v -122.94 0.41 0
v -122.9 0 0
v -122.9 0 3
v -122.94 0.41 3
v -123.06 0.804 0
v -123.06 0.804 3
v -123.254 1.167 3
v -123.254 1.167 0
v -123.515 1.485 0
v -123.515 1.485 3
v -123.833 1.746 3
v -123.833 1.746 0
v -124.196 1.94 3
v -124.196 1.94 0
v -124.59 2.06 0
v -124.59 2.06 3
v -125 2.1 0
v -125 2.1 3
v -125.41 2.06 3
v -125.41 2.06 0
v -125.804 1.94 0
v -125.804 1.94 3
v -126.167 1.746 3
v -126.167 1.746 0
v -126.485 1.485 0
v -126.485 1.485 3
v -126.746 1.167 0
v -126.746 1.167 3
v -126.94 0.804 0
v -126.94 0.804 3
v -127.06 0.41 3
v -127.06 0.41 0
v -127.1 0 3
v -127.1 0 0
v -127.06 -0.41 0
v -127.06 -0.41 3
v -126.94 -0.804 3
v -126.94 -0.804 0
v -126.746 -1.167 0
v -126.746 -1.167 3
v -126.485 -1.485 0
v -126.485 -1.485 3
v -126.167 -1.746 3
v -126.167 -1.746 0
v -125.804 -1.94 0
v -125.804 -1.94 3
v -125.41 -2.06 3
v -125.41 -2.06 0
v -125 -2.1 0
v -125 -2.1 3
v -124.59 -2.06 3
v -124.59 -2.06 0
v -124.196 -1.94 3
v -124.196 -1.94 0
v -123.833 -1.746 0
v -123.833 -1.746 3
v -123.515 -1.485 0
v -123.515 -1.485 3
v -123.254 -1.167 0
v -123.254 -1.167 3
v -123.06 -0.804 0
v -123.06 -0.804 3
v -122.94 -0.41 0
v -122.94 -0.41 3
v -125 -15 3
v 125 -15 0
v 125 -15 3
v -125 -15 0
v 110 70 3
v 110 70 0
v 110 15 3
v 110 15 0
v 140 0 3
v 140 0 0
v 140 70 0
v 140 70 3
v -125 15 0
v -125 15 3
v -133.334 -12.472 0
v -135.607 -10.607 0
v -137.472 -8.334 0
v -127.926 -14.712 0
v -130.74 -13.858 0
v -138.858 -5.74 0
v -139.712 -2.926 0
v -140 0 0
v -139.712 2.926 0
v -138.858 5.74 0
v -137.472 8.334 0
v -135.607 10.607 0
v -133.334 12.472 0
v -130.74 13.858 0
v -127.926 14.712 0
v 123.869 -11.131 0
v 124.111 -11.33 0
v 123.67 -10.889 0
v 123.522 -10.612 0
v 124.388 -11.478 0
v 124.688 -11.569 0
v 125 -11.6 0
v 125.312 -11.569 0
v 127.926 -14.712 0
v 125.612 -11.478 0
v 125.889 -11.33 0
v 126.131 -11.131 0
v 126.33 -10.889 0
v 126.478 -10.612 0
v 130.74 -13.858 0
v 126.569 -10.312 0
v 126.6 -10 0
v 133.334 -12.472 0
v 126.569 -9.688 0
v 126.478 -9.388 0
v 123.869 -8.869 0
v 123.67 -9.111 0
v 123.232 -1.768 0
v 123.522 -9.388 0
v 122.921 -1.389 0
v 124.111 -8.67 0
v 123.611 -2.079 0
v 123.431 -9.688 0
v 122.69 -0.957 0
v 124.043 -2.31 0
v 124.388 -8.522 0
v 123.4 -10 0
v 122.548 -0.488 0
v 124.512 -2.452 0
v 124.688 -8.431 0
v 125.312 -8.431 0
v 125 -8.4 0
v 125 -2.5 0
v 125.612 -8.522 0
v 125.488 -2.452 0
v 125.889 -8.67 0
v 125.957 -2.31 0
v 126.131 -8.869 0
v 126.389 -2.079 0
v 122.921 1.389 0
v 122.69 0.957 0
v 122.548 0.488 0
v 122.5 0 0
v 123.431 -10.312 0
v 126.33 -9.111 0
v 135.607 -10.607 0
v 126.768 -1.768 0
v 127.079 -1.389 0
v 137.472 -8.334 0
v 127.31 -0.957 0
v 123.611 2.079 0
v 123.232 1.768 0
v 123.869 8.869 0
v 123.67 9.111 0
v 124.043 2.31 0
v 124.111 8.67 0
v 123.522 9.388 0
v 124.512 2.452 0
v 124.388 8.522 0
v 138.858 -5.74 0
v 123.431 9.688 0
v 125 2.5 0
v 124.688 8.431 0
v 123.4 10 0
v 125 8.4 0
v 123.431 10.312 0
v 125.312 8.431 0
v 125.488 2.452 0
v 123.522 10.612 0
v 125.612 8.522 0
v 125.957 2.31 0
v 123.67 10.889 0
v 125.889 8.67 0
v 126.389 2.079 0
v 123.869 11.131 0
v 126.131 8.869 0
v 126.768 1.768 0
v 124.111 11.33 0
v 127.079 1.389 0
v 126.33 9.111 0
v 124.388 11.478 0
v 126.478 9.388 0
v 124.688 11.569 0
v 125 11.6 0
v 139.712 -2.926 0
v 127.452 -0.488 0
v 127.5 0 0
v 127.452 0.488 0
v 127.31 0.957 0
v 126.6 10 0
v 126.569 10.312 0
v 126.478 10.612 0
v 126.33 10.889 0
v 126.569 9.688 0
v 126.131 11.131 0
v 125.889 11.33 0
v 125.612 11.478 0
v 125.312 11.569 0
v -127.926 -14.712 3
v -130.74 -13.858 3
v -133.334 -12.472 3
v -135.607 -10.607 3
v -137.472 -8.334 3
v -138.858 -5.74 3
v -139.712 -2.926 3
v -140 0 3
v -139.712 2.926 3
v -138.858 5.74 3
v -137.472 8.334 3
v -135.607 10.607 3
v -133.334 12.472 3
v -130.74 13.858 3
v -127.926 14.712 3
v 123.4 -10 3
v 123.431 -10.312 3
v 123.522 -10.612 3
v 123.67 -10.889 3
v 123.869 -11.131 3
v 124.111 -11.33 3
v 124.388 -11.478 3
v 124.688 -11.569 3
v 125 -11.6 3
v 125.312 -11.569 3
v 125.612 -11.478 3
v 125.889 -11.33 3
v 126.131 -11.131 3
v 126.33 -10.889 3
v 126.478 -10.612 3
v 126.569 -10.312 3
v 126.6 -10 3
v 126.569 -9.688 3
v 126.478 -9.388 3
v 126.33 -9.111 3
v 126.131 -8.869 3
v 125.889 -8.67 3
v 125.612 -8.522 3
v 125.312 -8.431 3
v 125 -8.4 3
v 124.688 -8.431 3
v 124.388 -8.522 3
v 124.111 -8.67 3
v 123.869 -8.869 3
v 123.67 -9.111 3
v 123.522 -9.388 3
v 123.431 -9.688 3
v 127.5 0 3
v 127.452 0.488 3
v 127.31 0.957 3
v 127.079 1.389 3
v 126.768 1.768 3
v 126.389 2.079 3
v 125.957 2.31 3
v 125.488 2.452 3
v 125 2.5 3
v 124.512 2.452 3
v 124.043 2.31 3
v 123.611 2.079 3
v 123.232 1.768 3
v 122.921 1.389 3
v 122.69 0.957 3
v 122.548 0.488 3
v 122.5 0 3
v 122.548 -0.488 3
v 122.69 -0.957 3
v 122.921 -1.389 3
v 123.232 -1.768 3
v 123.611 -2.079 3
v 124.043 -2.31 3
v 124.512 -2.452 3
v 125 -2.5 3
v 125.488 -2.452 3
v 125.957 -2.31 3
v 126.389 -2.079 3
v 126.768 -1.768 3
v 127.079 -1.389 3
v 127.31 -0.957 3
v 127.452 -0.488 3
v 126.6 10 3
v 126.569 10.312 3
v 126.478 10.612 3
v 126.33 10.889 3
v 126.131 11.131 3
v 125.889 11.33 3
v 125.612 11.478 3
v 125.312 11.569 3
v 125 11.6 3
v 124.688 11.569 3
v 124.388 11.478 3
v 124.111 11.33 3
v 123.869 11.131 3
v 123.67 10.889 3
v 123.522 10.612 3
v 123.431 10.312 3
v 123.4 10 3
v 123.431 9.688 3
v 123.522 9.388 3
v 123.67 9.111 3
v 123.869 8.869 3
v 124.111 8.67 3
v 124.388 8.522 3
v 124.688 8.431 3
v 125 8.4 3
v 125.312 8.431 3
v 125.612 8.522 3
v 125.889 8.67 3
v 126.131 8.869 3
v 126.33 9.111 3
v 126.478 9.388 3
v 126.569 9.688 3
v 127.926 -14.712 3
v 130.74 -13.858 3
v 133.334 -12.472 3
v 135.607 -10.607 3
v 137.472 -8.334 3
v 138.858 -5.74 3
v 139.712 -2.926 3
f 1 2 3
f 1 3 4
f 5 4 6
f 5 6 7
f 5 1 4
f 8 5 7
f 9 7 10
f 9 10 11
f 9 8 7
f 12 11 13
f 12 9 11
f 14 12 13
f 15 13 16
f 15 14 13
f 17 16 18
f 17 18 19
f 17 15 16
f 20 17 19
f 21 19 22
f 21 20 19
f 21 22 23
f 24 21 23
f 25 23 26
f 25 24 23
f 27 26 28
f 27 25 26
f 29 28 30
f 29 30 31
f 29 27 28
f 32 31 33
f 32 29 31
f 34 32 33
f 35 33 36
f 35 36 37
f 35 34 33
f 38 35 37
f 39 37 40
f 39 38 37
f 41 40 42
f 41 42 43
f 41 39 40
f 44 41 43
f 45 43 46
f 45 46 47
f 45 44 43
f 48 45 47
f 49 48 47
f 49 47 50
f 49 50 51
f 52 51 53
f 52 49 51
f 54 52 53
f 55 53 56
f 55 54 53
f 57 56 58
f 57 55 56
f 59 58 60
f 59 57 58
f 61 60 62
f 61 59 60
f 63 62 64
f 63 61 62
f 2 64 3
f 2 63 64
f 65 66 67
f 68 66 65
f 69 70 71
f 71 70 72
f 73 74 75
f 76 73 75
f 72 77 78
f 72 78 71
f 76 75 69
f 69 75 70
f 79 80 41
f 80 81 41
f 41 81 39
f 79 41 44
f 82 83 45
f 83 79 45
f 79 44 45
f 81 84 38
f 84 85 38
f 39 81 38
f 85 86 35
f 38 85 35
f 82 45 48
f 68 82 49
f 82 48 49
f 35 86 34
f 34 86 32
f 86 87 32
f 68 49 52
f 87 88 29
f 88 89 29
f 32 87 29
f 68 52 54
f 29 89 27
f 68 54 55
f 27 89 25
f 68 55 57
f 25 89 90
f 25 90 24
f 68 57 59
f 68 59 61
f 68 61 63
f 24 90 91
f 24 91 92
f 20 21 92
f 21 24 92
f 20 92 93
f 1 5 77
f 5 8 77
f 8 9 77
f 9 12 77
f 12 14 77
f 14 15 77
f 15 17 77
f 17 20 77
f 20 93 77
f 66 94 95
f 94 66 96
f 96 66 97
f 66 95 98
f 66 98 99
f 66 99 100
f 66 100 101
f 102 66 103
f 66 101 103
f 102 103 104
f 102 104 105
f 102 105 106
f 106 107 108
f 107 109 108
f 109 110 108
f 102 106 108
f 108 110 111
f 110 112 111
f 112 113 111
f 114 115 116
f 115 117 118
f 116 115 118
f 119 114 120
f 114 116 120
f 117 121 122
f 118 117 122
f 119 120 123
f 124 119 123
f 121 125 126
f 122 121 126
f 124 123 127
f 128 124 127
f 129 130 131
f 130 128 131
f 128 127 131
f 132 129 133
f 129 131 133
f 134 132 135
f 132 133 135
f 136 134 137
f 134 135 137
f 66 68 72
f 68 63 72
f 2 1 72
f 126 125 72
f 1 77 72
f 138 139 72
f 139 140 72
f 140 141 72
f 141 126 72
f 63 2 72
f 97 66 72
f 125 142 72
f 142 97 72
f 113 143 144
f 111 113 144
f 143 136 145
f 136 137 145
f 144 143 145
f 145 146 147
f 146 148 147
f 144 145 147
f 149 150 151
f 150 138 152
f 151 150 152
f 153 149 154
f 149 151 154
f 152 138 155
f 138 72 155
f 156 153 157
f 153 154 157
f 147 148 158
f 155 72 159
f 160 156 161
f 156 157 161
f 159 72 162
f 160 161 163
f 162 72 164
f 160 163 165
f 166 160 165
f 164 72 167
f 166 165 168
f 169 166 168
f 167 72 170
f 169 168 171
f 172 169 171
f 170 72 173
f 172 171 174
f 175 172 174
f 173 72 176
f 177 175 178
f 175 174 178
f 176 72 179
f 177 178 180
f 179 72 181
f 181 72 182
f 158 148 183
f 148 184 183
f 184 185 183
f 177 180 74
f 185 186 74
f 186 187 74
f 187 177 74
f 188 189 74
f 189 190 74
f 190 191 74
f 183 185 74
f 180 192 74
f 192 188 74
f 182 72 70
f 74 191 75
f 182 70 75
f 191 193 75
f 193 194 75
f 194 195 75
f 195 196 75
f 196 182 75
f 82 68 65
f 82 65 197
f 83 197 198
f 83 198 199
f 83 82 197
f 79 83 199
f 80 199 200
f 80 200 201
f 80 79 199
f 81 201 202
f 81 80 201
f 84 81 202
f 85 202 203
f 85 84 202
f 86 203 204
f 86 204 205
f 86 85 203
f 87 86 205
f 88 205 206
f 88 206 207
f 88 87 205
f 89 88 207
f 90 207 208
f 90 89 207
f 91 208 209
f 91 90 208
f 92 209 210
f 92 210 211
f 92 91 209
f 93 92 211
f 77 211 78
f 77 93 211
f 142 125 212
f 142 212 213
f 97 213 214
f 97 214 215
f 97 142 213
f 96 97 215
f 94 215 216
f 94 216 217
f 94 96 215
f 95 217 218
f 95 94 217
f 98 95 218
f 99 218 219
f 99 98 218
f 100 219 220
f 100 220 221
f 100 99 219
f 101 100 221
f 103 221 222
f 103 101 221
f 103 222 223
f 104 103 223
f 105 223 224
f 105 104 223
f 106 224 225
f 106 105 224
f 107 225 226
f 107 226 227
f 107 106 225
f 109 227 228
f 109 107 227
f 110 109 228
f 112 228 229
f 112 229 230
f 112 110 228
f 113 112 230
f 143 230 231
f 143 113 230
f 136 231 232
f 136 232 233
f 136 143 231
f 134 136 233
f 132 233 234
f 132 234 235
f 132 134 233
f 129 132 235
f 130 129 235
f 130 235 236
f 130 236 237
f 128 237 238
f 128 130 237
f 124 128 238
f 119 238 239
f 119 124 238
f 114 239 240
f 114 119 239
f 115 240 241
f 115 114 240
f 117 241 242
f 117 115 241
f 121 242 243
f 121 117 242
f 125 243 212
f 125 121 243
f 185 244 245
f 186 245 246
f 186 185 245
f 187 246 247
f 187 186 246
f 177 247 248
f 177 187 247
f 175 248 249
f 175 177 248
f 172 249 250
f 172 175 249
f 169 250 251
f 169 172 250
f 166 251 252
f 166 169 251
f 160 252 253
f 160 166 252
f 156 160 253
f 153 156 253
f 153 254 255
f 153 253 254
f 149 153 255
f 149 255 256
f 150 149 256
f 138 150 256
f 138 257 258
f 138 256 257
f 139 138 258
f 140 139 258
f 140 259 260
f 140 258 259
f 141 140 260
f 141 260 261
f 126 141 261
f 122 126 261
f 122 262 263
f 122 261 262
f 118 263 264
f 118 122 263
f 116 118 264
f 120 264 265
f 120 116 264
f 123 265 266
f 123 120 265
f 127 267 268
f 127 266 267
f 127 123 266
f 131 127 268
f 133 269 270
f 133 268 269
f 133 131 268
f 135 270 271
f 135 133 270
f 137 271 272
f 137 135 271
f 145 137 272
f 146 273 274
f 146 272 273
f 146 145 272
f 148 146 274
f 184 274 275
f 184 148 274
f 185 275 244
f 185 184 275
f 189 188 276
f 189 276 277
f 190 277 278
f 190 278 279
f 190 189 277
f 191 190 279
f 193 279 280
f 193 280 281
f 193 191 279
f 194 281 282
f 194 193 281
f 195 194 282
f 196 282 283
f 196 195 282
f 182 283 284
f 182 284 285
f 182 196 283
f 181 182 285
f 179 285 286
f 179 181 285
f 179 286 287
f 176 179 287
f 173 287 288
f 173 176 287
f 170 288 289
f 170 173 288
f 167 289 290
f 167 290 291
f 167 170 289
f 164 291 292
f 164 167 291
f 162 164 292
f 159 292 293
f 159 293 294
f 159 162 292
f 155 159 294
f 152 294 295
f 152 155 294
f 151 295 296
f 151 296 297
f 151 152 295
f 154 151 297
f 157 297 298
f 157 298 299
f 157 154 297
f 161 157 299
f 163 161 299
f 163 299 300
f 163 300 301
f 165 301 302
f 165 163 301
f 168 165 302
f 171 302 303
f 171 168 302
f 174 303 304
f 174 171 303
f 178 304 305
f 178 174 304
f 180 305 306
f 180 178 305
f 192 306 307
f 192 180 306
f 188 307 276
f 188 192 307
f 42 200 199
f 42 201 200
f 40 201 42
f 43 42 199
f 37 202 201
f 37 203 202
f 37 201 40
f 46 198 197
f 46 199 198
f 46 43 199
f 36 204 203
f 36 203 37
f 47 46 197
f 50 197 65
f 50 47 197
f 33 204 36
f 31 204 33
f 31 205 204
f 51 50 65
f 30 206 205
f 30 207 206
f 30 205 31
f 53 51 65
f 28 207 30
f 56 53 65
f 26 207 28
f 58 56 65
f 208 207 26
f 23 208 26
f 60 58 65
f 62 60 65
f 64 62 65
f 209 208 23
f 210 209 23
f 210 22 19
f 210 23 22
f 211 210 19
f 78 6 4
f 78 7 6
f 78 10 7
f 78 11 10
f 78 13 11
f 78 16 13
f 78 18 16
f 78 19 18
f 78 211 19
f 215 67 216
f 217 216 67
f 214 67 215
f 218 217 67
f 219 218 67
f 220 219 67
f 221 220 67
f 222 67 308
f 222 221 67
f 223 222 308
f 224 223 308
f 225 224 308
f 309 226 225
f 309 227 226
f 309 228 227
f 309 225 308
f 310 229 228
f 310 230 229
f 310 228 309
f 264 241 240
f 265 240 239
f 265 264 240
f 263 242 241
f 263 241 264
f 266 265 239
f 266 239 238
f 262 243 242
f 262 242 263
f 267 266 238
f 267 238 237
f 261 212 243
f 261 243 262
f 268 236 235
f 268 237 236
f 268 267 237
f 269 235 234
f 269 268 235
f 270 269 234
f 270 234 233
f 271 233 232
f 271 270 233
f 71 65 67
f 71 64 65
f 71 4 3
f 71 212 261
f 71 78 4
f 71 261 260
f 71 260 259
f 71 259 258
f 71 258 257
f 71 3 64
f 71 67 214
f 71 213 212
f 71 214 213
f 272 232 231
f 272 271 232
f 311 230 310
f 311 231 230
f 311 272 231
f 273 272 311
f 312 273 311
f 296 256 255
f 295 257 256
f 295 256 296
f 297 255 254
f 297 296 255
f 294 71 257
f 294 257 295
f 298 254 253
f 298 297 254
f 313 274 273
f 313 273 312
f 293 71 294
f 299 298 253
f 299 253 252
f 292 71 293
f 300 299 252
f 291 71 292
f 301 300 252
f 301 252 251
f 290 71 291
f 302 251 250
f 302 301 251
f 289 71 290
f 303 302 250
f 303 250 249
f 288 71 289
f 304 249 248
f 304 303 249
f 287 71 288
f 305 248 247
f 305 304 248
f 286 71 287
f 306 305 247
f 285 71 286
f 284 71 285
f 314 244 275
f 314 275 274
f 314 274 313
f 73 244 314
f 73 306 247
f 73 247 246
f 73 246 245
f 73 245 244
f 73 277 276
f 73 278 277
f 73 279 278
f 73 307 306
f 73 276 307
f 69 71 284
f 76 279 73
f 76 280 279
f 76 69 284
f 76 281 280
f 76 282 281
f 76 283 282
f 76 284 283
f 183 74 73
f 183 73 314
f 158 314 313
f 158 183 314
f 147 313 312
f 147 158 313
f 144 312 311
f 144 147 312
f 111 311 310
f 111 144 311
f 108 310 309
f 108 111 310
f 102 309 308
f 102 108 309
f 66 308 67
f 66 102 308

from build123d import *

# Parameters (mm, degrees)
ESQUISSE1_R        = 2.5
ESQUISSE1_R_2      = 2.1
ESQUISSE1_R_3      = 1.6
BOSS_EXTRU_1_DEPTH = 3
BOSS_EXTRU_2_START = -3
ESQUISSE2_R        = 1.6
BOSS_EXTRU_2_DEPTH = 3


with BuildPart() as part:
    # Esquisse1 → Boss.-Extru.1 (new body)
    with BuildSketch(Plane.XY):
        with BuildLine():
            Line((-125, 15), (125, 15))
            ThreePointArc((125, 15), (140, 0), (125, -15))
            Line((125, -15), (-125, -15))
            ThreePointArc((-125, -15), (-140, 0), (-125, 15))
        make_face()
        with Locations((125, 0)):
            Circle(ESQUISSE1_R, mode=Mode.SUBTRACT)
        with Locations((-125, 0)):
            Circle(ESQUISSE1_R_2, mode=Mode.SUBTRACT)
        with Locations((125, 10)):
            Circle(ESQUISSE1_R_3, mode=Mode.SUBTRACT)
        with Locations(Location((125, -10, 0), (0, 0, 180))):
            Circle(ESQUISSE1_R_3, mode=Mode.SUBTRACT)
    extrude(amount=BOSS_EXTRU_1_DEPTH)

    # Esquisse2 → Boss.-Extru.2 (add)
    with BuildSketch(Plane.XY.offset(3).offset(BOSS_EXTRU_2_START)):
        with BuildLine():
            Line((140, 70), (110, 70))
            Line((110, 70), (110, 0))
            Line((110, 0), (122.5, 0))
            ThreePointArc((122.5, 0), (125, 2.5), (127.5, 0))
            Line((127.5, 0), (140, 0))
            Line((140, 0), (140, 70))
        make_face()
        with Locations((125, 10)):
            Circle(ESQUISSE2_R, mode=Mode.SUBTRACT)
    extrude(amount=BOSS_EXTRU_2_DEPTH)


solid = part.part
